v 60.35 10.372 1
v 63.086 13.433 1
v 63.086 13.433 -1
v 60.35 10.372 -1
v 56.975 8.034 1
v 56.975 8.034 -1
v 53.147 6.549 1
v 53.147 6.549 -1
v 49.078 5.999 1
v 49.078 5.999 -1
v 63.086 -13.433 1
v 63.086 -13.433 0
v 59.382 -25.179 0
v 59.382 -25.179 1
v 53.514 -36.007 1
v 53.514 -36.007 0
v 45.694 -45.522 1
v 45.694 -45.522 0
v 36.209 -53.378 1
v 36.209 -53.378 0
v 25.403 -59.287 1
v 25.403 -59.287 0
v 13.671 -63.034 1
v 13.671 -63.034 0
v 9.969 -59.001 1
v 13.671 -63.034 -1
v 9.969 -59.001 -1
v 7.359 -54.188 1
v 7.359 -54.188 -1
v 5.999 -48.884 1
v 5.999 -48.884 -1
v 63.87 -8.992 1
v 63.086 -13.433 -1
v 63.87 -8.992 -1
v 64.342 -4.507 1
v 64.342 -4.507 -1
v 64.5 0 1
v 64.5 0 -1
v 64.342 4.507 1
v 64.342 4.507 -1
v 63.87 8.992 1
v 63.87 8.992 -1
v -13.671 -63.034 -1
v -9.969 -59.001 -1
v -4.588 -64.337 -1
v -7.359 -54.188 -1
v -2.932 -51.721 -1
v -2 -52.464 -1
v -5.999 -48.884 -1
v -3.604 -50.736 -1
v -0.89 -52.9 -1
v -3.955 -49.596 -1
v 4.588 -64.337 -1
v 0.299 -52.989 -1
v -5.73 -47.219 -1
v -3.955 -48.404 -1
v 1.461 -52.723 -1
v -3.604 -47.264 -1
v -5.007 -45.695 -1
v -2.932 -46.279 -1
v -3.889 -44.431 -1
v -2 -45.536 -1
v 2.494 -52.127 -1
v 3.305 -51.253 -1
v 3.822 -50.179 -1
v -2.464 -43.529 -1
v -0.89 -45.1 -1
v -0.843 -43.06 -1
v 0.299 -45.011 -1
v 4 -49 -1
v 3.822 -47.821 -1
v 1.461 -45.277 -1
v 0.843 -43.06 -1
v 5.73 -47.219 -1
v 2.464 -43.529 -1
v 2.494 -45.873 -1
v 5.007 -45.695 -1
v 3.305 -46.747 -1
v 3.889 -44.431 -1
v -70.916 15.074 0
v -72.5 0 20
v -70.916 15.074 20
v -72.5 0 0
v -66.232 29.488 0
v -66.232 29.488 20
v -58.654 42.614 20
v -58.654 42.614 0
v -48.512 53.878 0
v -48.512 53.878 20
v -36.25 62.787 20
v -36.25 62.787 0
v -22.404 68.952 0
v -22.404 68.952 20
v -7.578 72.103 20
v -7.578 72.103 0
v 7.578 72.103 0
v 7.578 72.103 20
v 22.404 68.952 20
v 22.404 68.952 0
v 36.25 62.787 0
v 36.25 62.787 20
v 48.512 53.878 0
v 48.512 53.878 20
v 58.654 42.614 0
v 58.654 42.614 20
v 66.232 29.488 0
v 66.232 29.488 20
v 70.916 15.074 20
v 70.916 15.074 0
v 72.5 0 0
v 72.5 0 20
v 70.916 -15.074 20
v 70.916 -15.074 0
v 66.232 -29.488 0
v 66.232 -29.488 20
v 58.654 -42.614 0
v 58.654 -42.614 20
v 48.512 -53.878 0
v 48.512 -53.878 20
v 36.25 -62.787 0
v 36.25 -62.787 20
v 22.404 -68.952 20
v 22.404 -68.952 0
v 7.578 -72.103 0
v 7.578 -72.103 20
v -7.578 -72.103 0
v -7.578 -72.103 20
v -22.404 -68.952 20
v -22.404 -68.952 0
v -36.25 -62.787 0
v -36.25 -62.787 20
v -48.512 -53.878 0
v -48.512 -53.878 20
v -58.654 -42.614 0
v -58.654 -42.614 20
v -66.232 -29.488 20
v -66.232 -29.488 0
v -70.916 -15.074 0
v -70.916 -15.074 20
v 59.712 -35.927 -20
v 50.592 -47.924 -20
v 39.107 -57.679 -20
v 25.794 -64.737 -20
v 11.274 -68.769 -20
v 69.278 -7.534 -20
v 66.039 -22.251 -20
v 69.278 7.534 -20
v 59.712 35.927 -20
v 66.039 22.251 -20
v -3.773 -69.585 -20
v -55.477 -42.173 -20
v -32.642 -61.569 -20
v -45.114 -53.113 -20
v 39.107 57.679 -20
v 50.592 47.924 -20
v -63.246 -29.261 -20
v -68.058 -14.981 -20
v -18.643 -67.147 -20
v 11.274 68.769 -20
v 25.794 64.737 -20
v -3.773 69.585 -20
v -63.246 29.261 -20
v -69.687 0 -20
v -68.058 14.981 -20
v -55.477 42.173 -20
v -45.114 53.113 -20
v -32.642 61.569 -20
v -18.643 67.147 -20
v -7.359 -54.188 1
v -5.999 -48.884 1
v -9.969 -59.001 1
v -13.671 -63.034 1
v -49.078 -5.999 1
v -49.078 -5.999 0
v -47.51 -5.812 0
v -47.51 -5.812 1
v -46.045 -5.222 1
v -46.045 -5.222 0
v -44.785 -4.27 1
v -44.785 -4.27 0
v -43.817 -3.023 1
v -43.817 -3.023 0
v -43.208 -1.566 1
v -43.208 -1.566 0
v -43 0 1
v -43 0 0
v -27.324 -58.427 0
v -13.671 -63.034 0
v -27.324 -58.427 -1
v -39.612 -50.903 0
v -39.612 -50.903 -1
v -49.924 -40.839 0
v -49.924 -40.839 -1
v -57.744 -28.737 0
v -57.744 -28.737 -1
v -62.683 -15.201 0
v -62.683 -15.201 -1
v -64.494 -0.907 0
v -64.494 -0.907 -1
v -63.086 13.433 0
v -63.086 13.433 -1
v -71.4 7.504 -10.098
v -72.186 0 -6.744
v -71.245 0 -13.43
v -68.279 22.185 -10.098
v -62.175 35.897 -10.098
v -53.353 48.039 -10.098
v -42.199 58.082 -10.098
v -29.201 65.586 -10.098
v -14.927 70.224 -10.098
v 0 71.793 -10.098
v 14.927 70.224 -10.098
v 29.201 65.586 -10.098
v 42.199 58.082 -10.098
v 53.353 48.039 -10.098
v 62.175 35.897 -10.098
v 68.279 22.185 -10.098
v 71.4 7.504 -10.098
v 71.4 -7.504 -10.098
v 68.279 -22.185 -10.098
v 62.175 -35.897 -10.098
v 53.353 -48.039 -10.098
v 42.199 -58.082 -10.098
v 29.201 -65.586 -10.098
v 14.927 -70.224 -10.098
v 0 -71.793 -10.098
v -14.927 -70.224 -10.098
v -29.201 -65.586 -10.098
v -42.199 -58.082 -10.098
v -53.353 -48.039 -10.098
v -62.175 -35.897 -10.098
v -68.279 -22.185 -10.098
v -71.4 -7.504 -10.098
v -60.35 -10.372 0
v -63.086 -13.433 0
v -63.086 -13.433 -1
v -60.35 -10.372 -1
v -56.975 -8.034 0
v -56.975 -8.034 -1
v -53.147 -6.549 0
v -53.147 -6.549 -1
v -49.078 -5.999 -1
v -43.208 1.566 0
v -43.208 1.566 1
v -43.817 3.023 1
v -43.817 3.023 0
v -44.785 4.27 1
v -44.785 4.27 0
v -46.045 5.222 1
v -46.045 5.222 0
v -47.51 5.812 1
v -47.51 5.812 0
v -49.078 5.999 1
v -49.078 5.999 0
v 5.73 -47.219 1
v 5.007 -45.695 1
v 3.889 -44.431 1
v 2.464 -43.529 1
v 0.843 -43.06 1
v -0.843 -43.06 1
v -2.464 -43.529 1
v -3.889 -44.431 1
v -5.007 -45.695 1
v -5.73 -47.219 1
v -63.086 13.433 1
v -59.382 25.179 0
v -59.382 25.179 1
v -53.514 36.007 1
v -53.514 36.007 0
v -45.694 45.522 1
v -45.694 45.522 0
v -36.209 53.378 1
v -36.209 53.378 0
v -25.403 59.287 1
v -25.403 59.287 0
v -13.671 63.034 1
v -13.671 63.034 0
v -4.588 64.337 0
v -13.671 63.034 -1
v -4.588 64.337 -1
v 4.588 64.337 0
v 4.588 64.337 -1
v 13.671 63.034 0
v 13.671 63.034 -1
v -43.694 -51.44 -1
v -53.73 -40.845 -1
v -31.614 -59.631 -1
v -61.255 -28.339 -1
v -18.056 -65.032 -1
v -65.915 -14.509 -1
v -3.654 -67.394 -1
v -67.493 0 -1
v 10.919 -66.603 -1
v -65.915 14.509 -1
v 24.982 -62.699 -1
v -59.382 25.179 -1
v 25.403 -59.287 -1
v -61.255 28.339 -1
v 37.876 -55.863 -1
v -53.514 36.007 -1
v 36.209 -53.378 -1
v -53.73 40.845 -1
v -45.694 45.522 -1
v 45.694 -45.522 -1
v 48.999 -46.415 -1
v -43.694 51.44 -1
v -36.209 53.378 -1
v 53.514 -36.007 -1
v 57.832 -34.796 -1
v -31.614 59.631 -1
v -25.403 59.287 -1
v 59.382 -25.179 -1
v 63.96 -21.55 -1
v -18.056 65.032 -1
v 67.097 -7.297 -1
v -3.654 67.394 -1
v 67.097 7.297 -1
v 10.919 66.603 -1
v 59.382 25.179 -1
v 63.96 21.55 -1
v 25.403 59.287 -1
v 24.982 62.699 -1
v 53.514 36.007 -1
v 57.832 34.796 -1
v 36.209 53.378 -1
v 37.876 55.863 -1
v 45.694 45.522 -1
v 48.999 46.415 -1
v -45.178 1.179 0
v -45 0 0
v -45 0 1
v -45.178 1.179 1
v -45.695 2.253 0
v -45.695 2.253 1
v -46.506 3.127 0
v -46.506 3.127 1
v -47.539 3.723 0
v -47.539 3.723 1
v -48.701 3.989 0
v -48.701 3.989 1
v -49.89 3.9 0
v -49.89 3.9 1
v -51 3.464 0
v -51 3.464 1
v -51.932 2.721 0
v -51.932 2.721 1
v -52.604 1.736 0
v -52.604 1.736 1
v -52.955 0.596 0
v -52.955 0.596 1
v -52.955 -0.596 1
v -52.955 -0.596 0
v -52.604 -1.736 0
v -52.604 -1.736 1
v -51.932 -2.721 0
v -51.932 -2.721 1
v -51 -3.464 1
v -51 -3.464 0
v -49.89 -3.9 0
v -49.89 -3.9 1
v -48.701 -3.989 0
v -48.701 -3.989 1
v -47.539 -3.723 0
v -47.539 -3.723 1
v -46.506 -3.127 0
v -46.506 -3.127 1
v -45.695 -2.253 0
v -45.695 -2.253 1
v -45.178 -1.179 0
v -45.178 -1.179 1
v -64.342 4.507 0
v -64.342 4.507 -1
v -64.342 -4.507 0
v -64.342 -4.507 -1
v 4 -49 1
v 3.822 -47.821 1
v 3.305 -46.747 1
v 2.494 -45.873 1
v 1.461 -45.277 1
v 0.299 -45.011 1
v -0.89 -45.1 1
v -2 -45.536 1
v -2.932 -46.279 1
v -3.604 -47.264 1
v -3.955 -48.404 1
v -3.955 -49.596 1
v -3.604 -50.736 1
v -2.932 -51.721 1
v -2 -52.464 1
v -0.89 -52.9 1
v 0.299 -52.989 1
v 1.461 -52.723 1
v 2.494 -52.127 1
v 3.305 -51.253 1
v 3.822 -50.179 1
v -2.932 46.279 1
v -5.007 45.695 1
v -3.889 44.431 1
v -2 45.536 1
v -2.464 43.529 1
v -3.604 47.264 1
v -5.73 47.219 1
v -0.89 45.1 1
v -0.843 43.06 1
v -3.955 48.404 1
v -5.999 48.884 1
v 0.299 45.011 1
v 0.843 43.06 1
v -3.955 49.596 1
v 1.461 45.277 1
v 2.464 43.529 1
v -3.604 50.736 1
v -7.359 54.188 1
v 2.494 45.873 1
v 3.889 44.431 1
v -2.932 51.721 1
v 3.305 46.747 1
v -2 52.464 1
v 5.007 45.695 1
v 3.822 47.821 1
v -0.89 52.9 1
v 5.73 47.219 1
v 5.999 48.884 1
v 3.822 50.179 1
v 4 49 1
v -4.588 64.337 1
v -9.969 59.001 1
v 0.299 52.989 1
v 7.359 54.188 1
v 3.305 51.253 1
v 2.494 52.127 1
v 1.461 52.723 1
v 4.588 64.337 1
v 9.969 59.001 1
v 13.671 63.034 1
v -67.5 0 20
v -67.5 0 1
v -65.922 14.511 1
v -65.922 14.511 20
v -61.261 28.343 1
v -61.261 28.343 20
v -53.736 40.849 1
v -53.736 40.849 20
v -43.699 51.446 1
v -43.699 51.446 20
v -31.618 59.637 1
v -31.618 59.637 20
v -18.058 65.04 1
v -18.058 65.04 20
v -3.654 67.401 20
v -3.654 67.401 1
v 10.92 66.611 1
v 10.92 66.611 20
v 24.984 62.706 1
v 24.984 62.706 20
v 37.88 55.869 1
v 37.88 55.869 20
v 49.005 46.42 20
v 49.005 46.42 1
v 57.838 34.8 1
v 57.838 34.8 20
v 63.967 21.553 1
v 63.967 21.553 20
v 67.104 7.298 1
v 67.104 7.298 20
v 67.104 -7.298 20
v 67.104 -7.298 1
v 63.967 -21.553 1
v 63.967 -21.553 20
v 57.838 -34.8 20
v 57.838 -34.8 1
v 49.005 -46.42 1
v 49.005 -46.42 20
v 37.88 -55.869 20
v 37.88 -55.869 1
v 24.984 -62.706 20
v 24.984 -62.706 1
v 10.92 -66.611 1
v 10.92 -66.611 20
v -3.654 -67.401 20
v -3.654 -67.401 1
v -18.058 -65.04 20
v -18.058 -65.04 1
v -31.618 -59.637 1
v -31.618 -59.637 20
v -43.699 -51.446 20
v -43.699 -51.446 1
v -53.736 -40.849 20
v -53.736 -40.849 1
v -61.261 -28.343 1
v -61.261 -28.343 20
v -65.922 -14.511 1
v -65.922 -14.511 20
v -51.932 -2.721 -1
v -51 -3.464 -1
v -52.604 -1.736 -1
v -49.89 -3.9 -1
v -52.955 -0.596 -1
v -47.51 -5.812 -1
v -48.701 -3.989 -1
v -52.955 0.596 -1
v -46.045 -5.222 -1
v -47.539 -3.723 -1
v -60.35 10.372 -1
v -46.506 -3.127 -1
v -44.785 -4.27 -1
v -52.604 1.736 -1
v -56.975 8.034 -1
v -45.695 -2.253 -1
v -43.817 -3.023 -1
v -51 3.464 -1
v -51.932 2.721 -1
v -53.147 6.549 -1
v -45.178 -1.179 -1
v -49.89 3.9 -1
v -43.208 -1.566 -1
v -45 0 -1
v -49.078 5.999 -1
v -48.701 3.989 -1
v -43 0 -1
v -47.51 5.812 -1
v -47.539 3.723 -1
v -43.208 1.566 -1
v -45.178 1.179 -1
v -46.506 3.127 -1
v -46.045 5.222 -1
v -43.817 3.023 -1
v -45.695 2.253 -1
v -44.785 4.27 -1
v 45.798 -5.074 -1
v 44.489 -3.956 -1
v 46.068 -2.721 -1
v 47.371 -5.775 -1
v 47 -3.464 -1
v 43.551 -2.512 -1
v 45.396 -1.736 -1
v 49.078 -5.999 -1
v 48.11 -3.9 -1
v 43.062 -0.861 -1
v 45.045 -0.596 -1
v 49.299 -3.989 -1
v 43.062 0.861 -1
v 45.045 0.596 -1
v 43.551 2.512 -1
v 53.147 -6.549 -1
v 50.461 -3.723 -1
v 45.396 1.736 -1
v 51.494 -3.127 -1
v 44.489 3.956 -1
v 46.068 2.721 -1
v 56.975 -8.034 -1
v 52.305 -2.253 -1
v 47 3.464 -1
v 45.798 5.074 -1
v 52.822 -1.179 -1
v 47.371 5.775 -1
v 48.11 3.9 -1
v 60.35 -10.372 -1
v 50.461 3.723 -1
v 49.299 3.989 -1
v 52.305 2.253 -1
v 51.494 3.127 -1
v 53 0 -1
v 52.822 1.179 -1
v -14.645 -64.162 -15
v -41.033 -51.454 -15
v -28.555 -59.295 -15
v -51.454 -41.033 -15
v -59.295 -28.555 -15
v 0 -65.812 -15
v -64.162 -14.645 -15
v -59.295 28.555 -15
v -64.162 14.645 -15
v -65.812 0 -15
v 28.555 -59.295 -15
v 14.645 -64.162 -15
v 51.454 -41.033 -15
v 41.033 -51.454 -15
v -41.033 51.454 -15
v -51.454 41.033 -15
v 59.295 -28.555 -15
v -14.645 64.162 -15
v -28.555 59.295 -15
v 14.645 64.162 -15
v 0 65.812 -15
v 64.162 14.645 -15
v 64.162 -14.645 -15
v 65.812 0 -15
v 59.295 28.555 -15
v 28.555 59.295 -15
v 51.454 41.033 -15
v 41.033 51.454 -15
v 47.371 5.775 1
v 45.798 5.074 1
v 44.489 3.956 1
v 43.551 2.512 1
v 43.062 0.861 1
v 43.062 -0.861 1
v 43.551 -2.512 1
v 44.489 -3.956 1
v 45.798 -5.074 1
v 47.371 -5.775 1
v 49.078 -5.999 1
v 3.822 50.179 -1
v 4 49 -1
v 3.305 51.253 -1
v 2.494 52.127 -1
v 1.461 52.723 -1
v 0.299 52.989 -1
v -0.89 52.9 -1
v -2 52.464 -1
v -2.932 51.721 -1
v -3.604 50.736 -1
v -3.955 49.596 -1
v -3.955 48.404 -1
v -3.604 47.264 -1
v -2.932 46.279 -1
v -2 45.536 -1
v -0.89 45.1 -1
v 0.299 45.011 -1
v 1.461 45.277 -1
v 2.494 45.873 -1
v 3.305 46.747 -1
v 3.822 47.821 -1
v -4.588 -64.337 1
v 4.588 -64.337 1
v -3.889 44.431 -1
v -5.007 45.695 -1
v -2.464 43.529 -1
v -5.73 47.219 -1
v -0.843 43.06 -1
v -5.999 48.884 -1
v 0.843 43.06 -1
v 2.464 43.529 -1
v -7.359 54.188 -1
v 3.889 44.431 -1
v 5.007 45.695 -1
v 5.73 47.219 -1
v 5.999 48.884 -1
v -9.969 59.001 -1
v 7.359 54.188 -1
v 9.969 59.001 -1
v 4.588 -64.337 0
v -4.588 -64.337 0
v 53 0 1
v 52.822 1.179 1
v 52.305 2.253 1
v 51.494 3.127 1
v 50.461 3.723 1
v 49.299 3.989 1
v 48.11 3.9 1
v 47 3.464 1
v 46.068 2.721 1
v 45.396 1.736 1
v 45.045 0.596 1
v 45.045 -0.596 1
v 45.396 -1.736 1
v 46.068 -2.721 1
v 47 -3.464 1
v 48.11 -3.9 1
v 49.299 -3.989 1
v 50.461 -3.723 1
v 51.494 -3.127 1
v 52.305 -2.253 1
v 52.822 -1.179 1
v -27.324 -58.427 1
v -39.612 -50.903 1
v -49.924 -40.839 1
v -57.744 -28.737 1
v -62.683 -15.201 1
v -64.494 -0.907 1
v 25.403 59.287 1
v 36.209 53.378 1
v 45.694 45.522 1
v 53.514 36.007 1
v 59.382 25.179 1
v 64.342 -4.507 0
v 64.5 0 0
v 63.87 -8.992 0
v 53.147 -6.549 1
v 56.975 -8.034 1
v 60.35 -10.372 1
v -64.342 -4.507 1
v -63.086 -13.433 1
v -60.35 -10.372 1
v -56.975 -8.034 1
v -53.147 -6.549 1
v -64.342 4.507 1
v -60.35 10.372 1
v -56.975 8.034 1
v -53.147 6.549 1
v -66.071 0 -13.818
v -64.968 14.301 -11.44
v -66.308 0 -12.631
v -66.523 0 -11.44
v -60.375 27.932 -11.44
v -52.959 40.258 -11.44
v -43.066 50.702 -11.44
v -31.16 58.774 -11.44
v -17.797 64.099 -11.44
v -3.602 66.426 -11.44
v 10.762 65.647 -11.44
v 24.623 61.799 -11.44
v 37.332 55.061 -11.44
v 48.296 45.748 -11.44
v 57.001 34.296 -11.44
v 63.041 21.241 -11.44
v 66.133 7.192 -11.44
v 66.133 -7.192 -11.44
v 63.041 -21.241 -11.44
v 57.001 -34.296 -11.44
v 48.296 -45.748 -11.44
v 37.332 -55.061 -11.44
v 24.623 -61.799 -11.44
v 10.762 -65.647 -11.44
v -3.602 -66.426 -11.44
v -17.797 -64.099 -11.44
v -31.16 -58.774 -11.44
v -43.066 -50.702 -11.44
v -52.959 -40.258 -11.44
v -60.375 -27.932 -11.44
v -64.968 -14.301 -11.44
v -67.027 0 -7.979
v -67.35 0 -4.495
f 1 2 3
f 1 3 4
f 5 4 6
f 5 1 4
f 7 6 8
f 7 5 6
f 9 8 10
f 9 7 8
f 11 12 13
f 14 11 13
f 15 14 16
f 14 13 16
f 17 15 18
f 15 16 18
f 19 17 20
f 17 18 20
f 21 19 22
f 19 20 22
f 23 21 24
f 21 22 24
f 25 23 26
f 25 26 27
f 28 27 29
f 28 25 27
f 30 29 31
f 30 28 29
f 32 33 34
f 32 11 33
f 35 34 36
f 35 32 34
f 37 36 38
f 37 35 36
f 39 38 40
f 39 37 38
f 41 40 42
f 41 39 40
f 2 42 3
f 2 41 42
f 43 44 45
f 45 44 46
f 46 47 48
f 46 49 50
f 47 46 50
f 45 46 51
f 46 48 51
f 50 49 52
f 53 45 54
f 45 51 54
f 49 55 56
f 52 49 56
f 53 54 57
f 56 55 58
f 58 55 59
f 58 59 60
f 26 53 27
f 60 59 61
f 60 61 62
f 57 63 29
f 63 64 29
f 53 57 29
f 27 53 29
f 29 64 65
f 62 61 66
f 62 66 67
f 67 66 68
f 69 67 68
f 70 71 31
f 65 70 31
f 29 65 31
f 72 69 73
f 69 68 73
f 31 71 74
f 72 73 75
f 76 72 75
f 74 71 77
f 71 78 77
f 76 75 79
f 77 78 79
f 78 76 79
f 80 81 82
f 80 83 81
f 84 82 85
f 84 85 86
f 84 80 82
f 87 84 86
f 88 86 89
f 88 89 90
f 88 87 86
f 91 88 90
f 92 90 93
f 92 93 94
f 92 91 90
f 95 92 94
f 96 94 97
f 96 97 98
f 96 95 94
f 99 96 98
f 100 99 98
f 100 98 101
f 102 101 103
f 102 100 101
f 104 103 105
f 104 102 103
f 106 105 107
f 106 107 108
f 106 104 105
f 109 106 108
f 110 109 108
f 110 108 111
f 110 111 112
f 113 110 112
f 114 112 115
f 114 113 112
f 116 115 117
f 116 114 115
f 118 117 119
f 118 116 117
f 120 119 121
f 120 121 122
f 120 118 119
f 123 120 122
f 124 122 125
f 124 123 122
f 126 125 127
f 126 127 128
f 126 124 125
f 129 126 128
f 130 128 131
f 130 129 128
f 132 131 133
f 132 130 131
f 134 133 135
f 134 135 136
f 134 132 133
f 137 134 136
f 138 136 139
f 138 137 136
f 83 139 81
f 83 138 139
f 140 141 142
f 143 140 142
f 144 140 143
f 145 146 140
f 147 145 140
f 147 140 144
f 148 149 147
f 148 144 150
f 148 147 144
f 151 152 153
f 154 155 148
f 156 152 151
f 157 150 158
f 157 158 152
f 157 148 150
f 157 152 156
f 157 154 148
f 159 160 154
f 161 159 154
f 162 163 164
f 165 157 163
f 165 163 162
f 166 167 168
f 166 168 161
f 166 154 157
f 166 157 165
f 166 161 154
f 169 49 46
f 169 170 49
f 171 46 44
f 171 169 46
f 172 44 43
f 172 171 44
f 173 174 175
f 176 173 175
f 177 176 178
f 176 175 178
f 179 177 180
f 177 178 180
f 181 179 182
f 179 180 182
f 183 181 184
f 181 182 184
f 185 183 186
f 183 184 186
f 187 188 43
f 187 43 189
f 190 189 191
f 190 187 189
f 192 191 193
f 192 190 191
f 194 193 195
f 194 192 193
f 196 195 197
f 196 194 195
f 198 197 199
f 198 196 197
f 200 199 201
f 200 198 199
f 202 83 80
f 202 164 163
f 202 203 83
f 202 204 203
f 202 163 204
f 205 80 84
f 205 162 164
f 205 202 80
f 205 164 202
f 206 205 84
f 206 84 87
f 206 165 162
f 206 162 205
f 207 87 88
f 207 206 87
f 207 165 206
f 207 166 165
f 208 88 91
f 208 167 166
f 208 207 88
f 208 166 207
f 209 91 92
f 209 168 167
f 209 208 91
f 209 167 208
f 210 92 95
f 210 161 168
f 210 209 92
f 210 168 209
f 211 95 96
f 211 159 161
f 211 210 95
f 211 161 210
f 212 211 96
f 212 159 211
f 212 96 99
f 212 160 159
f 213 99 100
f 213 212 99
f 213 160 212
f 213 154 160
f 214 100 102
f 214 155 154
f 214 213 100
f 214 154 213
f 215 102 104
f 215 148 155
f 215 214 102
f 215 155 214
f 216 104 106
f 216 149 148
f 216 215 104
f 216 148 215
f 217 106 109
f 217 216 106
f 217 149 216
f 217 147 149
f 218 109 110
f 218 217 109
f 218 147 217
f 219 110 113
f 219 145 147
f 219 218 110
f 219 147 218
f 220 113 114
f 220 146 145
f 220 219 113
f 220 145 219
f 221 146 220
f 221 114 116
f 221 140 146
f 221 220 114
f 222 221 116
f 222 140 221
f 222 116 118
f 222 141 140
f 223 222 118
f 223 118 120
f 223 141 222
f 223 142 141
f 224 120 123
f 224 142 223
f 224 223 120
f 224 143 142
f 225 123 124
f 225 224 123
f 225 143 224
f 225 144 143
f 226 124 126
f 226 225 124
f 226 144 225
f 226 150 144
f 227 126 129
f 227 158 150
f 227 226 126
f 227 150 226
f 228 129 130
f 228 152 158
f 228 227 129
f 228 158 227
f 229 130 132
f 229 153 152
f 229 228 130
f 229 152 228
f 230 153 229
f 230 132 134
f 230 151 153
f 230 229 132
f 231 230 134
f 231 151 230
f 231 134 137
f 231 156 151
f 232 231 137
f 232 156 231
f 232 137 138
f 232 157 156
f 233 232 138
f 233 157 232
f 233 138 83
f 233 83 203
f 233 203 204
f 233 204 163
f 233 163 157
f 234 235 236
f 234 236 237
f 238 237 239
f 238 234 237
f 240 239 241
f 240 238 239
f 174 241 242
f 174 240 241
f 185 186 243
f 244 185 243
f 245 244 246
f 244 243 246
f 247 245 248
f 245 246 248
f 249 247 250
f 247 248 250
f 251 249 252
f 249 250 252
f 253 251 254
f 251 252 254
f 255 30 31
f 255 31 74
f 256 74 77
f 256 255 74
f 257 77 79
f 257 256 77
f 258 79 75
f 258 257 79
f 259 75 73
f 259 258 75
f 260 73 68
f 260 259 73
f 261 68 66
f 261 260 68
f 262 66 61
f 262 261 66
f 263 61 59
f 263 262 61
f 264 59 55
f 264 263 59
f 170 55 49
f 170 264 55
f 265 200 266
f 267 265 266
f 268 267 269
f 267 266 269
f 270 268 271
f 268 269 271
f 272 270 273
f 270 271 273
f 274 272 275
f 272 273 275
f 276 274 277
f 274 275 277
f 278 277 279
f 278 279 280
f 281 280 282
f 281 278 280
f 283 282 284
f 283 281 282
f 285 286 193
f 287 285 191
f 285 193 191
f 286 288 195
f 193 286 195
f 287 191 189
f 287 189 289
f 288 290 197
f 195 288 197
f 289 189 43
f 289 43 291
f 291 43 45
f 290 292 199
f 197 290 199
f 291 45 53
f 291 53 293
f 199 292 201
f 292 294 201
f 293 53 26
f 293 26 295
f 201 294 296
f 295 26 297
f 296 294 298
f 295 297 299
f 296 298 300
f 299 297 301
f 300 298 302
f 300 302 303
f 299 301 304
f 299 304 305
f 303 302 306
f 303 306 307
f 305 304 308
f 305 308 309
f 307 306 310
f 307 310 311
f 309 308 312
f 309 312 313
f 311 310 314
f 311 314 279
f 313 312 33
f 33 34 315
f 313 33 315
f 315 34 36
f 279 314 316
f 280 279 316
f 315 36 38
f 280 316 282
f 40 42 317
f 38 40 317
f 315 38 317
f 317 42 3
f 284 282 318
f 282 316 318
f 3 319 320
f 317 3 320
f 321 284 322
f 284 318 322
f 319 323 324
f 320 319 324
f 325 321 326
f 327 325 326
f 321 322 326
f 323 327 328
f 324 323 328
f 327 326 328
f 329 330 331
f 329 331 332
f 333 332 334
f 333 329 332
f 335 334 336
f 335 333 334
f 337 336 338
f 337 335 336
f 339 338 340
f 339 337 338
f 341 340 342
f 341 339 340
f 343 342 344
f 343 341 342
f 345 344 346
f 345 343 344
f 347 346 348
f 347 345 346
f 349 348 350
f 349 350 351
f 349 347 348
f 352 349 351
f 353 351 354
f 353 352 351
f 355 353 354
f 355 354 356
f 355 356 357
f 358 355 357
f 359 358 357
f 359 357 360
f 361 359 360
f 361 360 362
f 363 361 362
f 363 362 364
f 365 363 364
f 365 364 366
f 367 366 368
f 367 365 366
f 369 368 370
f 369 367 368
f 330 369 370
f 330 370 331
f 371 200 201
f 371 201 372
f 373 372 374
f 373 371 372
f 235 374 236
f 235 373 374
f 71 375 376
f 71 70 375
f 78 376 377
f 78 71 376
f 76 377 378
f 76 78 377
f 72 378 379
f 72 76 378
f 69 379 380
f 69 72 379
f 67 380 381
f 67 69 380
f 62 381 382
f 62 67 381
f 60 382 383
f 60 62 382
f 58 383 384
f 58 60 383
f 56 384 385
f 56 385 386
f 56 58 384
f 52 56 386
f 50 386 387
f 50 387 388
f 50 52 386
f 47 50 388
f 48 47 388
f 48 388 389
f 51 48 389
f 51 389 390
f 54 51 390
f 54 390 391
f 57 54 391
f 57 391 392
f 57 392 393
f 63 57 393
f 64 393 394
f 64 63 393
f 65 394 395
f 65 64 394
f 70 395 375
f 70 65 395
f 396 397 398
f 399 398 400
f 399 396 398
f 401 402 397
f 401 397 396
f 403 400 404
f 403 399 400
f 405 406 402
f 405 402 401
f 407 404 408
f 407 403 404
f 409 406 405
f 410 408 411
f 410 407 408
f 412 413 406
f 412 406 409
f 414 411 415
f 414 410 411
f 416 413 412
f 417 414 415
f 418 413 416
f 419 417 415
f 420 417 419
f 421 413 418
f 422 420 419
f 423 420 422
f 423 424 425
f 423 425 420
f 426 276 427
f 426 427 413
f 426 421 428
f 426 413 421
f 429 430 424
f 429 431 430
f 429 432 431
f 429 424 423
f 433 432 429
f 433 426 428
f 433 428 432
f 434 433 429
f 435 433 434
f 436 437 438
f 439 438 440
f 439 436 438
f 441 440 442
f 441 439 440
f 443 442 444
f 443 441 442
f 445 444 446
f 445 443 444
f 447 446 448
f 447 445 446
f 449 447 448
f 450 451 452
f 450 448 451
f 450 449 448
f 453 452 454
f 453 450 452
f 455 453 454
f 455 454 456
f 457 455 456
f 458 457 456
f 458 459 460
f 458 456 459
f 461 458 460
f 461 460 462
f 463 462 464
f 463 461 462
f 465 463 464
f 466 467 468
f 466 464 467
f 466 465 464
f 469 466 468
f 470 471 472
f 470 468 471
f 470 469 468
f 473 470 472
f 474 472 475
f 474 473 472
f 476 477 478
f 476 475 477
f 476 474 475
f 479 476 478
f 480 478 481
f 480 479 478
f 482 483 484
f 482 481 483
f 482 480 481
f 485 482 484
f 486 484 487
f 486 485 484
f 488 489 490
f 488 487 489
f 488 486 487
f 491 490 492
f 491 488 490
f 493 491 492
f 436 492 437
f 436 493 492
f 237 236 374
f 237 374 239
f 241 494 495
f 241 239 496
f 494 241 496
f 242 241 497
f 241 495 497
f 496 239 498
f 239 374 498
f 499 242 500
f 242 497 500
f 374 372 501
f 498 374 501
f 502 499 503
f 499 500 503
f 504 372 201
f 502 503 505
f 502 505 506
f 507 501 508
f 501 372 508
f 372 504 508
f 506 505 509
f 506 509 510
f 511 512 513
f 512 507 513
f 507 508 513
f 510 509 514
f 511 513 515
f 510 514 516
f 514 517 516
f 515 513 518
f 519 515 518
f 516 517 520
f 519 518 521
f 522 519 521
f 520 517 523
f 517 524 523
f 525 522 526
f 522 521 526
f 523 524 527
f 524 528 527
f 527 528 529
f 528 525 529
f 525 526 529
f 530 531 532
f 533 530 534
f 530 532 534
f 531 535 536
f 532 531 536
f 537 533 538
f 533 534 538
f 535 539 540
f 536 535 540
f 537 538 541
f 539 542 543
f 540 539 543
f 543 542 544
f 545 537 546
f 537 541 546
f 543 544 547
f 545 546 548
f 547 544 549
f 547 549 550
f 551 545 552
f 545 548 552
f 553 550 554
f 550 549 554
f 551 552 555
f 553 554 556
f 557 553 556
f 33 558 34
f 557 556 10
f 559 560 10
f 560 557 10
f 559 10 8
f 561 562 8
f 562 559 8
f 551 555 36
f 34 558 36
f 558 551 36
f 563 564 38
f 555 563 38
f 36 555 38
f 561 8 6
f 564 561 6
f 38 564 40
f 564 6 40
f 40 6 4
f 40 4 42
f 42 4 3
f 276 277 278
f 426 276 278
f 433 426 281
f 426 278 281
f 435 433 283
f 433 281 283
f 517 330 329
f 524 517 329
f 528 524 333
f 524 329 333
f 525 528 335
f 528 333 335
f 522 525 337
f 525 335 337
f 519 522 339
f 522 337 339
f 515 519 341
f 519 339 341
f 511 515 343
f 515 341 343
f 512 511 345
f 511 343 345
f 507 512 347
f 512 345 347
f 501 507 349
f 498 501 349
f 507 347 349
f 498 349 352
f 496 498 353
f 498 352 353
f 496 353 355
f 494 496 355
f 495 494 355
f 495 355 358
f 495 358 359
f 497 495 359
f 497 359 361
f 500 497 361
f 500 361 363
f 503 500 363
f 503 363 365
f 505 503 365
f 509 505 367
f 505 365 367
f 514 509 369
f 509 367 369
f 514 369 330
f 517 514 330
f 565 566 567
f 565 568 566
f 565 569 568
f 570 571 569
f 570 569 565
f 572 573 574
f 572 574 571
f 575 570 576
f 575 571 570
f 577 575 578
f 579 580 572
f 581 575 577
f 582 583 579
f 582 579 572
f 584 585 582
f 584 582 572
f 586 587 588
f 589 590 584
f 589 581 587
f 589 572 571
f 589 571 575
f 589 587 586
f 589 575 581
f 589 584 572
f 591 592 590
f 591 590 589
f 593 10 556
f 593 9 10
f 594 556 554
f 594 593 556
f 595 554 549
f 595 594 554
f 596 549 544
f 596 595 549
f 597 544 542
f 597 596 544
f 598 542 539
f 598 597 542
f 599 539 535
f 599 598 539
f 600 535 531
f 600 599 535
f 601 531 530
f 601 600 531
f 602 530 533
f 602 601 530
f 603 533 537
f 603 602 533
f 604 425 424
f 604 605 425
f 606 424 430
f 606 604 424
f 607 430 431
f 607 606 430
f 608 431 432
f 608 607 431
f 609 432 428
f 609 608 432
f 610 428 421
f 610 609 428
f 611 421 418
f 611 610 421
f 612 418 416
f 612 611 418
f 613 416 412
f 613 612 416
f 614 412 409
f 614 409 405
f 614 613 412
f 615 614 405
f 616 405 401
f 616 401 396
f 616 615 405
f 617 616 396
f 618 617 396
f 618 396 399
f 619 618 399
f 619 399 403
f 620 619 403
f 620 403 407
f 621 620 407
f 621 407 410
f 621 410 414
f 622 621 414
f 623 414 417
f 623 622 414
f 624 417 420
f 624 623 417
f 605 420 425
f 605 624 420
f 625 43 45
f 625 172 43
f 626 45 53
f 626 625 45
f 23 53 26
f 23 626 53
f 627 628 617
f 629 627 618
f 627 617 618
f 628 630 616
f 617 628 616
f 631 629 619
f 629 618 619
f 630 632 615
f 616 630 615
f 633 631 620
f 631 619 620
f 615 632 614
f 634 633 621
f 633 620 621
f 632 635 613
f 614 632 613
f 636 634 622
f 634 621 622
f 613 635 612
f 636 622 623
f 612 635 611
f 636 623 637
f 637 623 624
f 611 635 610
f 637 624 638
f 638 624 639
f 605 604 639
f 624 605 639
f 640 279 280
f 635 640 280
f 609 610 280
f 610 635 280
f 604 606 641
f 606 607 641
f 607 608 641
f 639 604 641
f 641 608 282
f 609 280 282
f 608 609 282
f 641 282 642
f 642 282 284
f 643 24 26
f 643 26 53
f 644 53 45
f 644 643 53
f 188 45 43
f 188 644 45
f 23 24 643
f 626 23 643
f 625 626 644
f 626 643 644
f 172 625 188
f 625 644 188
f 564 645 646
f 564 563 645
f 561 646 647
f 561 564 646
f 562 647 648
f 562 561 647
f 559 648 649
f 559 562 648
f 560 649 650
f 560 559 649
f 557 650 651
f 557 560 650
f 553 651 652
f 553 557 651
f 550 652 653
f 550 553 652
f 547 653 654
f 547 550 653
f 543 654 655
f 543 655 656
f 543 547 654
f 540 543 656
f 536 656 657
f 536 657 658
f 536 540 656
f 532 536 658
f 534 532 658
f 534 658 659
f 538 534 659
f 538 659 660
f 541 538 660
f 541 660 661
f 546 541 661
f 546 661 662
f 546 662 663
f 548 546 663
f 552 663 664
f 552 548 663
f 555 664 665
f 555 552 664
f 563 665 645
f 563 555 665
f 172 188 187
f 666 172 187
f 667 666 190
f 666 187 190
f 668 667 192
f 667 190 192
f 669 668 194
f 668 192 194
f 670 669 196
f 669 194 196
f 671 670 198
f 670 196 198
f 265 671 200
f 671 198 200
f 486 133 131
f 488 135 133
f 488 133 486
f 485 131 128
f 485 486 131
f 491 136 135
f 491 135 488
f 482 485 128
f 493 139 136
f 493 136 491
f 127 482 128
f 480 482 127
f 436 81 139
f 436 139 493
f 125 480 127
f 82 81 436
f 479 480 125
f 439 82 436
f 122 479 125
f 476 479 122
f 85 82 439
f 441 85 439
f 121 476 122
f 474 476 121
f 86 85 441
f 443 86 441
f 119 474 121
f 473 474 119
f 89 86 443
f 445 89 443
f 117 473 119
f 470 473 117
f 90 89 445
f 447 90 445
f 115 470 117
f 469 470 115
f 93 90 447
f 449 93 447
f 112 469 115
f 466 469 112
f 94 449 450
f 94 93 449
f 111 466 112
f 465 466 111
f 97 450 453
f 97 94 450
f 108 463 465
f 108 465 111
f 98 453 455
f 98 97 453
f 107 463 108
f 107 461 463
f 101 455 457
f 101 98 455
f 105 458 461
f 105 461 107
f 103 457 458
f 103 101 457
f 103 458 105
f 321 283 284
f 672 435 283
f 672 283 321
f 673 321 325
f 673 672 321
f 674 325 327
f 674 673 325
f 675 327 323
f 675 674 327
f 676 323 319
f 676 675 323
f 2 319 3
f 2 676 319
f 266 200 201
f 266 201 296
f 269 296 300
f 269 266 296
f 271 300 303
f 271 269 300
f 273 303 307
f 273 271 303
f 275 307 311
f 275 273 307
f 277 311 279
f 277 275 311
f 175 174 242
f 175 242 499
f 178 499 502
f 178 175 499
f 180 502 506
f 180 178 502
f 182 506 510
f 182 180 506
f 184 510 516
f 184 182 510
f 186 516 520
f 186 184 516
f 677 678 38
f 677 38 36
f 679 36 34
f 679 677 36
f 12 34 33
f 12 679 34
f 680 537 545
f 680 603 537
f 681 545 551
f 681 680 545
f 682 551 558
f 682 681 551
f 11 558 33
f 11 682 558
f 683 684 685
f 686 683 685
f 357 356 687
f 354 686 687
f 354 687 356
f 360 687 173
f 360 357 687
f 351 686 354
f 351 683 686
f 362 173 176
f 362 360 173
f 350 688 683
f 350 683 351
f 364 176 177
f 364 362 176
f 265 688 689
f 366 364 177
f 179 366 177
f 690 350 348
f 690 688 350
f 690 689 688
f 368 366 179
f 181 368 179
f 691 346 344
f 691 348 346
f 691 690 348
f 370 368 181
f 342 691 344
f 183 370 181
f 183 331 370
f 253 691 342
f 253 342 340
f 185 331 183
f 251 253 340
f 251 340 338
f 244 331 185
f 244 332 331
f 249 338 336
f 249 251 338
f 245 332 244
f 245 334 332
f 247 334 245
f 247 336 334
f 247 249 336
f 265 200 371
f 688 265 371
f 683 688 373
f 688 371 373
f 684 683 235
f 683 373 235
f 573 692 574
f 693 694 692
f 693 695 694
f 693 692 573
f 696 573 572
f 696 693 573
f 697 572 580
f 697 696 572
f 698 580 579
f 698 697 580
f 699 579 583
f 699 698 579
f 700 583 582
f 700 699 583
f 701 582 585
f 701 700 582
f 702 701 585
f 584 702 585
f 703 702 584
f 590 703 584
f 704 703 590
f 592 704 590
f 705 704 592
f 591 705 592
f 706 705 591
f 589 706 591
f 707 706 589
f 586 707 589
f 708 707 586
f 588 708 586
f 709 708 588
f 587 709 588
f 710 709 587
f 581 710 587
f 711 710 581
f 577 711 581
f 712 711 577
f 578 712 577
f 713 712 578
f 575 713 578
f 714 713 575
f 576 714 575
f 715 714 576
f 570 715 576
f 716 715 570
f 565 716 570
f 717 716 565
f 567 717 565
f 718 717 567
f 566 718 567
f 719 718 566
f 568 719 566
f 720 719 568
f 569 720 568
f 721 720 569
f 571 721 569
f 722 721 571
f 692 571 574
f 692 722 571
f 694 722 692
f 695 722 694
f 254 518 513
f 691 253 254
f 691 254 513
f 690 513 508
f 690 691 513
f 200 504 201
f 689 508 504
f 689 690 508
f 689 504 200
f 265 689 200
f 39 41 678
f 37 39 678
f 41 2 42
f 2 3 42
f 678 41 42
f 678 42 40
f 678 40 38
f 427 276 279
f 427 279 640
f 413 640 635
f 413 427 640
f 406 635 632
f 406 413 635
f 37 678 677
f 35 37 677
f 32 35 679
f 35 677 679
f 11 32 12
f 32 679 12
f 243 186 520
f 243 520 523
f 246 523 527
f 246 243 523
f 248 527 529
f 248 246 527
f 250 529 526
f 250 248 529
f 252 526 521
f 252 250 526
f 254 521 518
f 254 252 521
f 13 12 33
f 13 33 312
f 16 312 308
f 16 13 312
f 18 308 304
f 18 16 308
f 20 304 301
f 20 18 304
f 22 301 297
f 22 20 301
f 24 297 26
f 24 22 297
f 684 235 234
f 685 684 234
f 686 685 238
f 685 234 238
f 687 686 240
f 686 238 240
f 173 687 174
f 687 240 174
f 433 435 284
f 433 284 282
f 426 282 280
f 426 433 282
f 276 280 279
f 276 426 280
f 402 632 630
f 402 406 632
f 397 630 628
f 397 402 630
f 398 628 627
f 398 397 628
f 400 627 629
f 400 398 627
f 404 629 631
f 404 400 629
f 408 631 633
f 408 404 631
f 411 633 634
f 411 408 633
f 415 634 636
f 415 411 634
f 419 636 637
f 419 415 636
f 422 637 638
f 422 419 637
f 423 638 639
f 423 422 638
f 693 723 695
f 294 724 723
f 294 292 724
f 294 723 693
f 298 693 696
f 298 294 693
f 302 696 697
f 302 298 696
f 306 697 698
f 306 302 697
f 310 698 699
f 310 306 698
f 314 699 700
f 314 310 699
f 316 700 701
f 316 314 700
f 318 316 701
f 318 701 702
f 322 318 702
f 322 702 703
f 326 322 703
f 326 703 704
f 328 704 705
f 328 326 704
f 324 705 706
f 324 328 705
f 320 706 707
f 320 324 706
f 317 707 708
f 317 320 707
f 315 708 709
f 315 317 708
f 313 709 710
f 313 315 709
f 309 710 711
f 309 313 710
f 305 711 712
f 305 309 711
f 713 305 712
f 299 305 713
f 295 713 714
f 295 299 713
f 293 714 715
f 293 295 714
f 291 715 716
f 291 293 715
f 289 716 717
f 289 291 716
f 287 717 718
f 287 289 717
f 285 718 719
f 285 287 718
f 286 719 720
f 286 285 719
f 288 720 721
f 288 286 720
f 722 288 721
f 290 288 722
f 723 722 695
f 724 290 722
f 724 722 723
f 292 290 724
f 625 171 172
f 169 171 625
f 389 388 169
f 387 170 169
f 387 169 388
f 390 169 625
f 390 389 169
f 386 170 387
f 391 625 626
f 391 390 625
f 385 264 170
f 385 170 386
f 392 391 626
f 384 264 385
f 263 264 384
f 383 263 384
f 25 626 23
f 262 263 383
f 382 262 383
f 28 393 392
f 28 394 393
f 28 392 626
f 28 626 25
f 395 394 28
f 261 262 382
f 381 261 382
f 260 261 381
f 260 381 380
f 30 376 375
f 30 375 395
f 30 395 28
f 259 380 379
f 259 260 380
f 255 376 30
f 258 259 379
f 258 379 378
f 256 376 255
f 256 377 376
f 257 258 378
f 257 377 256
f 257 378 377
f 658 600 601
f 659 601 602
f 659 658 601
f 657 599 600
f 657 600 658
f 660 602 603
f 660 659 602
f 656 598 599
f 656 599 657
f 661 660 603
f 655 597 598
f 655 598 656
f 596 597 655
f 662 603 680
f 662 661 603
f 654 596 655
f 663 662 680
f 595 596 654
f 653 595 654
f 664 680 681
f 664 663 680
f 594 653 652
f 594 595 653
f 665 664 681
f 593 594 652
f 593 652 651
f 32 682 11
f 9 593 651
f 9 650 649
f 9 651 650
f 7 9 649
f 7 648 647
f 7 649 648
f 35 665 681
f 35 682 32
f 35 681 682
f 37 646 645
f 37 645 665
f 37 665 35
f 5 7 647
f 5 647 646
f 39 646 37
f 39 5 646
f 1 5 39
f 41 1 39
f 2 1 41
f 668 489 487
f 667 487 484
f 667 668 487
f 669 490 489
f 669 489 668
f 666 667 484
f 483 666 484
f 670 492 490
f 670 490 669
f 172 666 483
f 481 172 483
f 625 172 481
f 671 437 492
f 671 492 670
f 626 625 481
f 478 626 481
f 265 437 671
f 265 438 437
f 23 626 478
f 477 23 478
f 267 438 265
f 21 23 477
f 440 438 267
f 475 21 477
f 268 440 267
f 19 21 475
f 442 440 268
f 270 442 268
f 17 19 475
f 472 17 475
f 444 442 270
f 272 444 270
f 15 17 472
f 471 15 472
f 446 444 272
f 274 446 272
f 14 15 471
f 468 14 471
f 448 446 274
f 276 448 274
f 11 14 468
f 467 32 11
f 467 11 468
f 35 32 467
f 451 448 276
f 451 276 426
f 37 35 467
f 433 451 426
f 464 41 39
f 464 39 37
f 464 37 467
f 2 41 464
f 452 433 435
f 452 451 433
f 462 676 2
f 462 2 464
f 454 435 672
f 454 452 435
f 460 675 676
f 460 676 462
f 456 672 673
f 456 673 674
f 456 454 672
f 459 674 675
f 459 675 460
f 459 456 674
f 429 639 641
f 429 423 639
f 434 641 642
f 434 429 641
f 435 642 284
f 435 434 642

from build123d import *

# Parameters (mm, degrees)
F0_R     = 4
F1_DEPTH = 1
F0_R_2   = 67.5
F3_DEPTH = 1


with BuildPart() as f1:
    # F0 (on Top) → F1 (new body, symmetric)
    with BuildSketch(Plane.XY):
        with BuildLine():
            ThreePointArc((63.085609693, -13.4333856366), (64.1454278386, -6.7538202079), (64.5, 0))
            ThreePointArc((64.5, 0), (64.1454278386, 6.7538202079), (63.085609693, 13.4333856366))
            ThreePointArc((63.085609693, 13.4333856366), (56.974835778, 8.034166581), (49.0784312352, 5.9994873565))
            ThreePointArc((49.0784312352, 5.9994873565), (53.2702802842, 4.2148198413), (55, 0))
            ThreePointArc((55, 0), (53.2702802842, -4.2148198413), (49.0784312352, -5.9994873565))
            ThreePointArc((49.0784312352, -5.9994873565), (56.974835778, -8.034166581), (63.085609693, -13.4333856366))
        make_face()
        with BuildLine():
            ThreePointArc((55, 0), (53.2702802842, 4.2148198413), (49.0784312352, 5.9994873565))
            ThreePointArc((49.0784312352, 5.9994873565), (43, 0), (49.0784312352, -5.9994873565))
            ThreePointArc((49.0784312352, -5.9994873565), (53.2702802842, -4.2148198413), (55, 0))
        make_face()
        with Locations((49, 0)):
            Circle(F0_R, mode=Mode.SUBTRACT)
    extrude(amount=F1_DEPTH, both=True)


with BuildPart() as f1b:
    # F0 (on Top) → F1, piece 2 (new body, symmetric)
    with BuildSketch(Plane.XY):
        with BuildLine():
            ThreePointArc((5.9988880077, 48.8844895219), (8.515751779, 56.6748662417), (13.671329053, 63.034472806))
            ThreePointArc((13.671329053, 63.034472806), (0, 64.5), (-13.671329053, 63.034472806))
            ThreePointArc((-13.671329053, 63.034472806), (-8.515751779, 56.6748662417), (-5.9988880077, 48.8844895219))
            ThreePointArc((-5.9988880077, 48.8844895219), (-0.0577579152, 54.9997219955), (6, 49))
            ThreePointArc((6, 49), (5.9997219955, 48.9422420848), (5.9988880077, 48.8844895219))
        make_face()
        with BuildLine():
            ThreePointArc((-5.9988880077, 48.8844895219), (0, 43), (5.9988880077, 48.8844895219))
            ThreePointArc((5.9988880077, 48.8844895219), (5.9997219955, 48.9422420848), (6, 49))
            ThreePointArc((6, 49), (-0.0577579152, 54.9997219955), (-5.9988880077, 48.8844895219))
        make_face()
        with Locations((0, 49)):
            Circle(F0_R, mode=Mode.SUBTRACT)
    extrude(amount=F1_DEPTH, both=True)


with BuildPart() as f1c:
    # F0 (on Top) → F1, piece 3 (new body, symmetric)
    with BuildSketch(Plane.XY):
        with BuildLine():
            ThreePointArc((-13.671329053, -63.034472806), (0, -64.5), (13.671329053, -63.034472806))
            ThreePointArc((13.671329053, -63.034472806), (8.515751779, -56.6748662417), (5.9988880077, -48.8844895219))
            ThreePointArc((5.9988880077, -48.8844895219), (5.9997219955, -48.9422420848), (6, -49))
            ThreePointArc((6, -49), (-0.0577579152, -54.9997219955), (-5.9988880077, -48.8844895219))
            ThreePointArc((-5.9988880077, -48.8844895219), (-8.515751779, -56.6748662417), (-13.671329053, -63.034472806))
        make_face()
        with BuildLine():
            ThreePointArc((6, -49), (5.9997219955, -48.9422420848), (5.9988880077, -48.8844895219))
            ThreePointArc((5.9988880077, -48.8844895219), (0, -43), (-5.9988880077, -48.8844895219))
            ThreePointArc((-5.9988880077, -48.8844895219), (-0.0577579152, -54.9997219955), (6, -49))
        make_face()
        with Locations((0, -49)):
            Circle(F0_R, mode=Mode.SUBTRACT)
    extrude(amount=F1_DEPTH, both=True)


with BuildPart() as f1d:
    # F0 (on Top) → F1, piece 4 (new body, symmetric)
    with BuildSketch(Plane.XY):
        with BuildLine():
            ThreePointArc((-49.0784312352, 5.9994873565), (-56.974835778, 8.034166581), (-63.085609693, 13.4333856366))
            ThreePointArc((-63.085609693, 13.4333856366), (-64.5, 0), (-63.085609693, -13.4333856366))
            ThreePointArc((-63.085609693, -13.4333856366), (-56.974835778, -8.034166581), (-49.0784312352, -5.9994873565))
            ThreePointArc((-49.0784312352, -5.9994873565), (-55, 0), (-49.0784312352, 5.9994873565))
        make_face()
        with BuildLine():
            ThreePointArc((-43, 0), (-44.7851801587, 4.2702802842), (-49.0784312352, 5.9994873565))
            ThreePointArc((-49.0784312352, 5.9994873565), (-55, 0), (-49.0784312352, -5.9994873565))
            ThreePointArc((-49.0784312352, -5.9994873565), (-44.7851801587, -4.2702802842), (-43, 0))
        make_face()
        with Locations((-49, 0)):
            Circle(F0_R, mode=Mode.SUBTRACT)
    extrude(amount=F1_DEPTH, both=True)


with BuildPart() as f3:
    # F0 (on Top) → F3 (new body, symmetric)
    with BuildSketch(Plane.XY):
        Circle(F0_R_2)
        with BuildLine():
            ThreePointArc((63.085609693, 13.4333856366), (64.1454278386, 6.7538202079), (64.5, 0))
            ThreePointArc((64.5, 0), (64.1454278386, -6.7538202079), (63.085609693, -13.4333856366))
            ThreePointArc((63.085609693, -13.4333856366), (45.6943527529, -45.5222596813), (13.671329053, -63.034472806))
            ThreePointArc((13.671329053, -63.034472806), (0, -64.5), (-13.671329053, -63.034472806))
            ThreePointArc((-13.671329053, -63.034472806), (-45.6943527529, -45.5222596813), (-63.085609693, -13.4333856366))
            ThreePointArc((-63.085609693, -13.4333856366), (-64.5, 0), (-63.085609693, 13.4333856366))
            ThreePointArc((-63.085609693, 13.4333856366), (-45.6943527529, 45.5222596813), (-13.671329053, 63.034472806))
            ThreePointArc((-13.671329053, 63.034472806), (0, 64.5), (13.671329053, 63.034472806))
            ThreePointArc((13.671329053, 63.034472806), (45.6943527529, 45.5222596813), (63.085609693, 13.4333856366))
        make_face(mode=Mode.SUBTRACT)
    extrude(amount=F3_DEPTH, both=True)

    # F2 (on Front) → F4 (revolve)
    with BuildSketch(Plane.XZ):
        with BuildLine():
            Line((0, -15), (-65.8122329054, -15))
            ThreePointArc((-65.8122329054, -15), (-66.1917705208, -13.2249580461), (-66.5234419851, -11.4403525492))
            ThreePointArc((-66.5234419851, -11.4403525492), (-67.215928307, -6.1861928378), (-67.4940807973, -0.893900067))
            ThreePointArc((-67.4940807973, -0.893900067), (-67.4985201831, -0.4469598323), (-67.5, 0))
            Line((-67.5, 0), (-67.5, 20))
            Line((-67.5, 20), (-72.5, 20))
            Line((-72.5, 20), (-72.5, 0))
            ThreePointArc((-72.5, 0), (-71.7932550835, -10.0984416873), (-69.6867993238, -20))
            Line((-69.6867993238, -20), (0, -20))
            Line((0, -20), (0, -15))
        make_face()
    revolve(axis=Axis((0, 0, 7.5), (0, 0, -1)))


solid = Compound([f1.part, f1b.part, f1c.part, f1d.part, f3.part])
